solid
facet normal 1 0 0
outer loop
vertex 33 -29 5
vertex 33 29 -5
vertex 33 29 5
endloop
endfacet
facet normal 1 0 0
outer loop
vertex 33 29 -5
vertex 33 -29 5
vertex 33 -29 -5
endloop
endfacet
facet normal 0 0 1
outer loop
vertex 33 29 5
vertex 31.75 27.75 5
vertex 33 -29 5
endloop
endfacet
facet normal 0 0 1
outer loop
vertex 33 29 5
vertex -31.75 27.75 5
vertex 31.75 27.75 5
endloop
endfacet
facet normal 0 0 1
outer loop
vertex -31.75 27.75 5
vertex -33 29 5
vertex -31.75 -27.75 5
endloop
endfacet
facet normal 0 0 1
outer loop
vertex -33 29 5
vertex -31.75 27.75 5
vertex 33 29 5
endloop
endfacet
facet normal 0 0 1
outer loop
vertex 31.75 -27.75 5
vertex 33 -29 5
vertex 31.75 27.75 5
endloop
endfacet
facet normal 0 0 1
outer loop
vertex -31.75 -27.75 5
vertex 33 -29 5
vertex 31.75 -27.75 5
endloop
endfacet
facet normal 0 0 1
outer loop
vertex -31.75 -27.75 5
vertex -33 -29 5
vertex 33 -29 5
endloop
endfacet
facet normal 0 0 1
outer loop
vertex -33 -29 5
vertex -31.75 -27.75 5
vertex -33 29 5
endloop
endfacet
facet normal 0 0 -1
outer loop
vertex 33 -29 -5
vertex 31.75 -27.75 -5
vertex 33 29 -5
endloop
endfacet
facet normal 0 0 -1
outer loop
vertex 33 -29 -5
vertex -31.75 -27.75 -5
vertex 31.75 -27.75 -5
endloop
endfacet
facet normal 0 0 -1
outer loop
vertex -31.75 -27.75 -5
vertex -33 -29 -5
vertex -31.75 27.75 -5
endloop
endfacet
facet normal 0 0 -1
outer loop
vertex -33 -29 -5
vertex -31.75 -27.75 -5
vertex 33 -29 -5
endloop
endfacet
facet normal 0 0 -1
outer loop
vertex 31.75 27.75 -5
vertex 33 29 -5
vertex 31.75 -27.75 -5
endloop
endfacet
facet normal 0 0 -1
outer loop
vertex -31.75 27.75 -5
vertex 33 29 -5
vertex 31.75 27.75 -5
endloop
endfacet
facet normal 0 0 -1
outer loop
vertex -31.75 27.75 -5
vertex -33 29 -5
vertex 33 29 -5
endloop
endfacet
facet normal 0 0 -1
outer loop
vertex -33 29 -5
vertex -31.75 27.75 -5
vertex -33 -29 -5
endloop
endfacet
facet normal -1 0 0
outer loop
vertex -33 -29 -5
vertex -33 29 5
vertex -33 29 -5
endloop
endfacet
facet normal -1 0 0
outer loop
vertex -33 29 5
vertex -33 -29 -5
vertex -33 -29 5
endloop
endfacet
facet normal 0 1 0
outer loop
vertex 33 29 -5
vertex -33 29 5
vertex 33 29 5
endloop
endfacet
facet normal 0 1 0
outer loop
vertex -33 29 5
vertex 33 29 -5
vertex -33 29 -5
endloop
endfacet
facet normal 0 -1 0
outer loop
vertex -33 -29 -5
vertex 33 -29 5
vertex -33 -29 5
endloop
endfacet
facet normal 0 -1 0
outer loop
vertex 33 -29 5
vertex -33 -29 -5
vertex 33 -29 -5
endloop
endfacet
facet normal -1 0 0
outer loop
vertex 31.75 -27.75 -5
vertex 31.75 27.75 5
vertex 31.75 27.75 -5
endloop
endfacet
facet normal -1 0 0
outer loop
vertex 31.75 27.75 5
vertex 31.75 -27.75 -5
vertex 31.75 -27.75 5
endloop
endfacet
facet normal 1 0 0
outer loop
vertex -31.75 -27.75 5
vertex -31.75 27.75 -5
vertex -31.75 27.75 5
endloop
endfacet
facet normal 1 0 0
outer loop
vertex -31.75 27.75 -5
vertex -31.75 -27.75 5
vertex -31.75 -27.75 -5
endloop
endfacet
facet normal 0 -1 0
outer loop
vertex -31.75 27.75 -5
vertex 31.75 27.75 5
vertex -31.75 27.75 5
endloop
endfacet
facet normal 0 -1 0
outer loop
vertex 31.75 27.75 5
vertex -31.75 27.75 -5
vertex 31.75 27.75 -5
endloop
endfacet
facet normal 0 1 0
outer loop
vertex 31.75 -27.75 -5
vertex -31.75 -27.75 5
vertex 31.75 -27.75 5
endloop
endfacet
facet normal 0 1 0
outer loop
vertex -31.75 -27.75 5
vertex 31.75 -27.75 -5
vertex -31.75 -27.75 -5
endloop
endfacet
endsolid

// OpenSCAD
// file: BOSL2/std.scad
// Minimal BOSL2 compatibility shim for bundled gallery models.
// It implements only the helpers used by the imported OpenSCAD projects.

CENTER = [0, 0, 0];
BOTTOM = [0, 0, -1];
TOP = [0, 0, 1];
LEFT = [-1, 0, 0];
RIGHT = [1, 0, 0];
FRONT = [0, -1, 0];
BACK = [0, 1, 0];

module up(z=0) {
    translate([0, 0, z]) children();
}

module down(z=0) {
    translate([0, 0, -z]) children();
}

module attach(anchor=CENTER) {
    children();
}

module cuboid(size=[1, 1, 1], anchor=CENTER) {
    center = anchor == CENTER;
    translate(center ? [0, 0, 0] : [0, 0, size[2] / 2])
        cube(size, center=true);
    children();
}

module xcyl(h=1, r=1, anchor=CENTER) {
    center = anchor == CENTER;
    translate(center ? [0, 0, 0] : [h / 2, 0, 0])
        rotate([0, 90, 0])
            cylinder(h=h, r=r, center=true);
}
// main file
include <BOSL2/std.scad>

difference(){
  cuboid([66,58,10], rounding=1, edges="Z", $fn=64);
  cuboid([63.5,55.5,10], rounding=1, edges="Z", $fn=64); 
}
